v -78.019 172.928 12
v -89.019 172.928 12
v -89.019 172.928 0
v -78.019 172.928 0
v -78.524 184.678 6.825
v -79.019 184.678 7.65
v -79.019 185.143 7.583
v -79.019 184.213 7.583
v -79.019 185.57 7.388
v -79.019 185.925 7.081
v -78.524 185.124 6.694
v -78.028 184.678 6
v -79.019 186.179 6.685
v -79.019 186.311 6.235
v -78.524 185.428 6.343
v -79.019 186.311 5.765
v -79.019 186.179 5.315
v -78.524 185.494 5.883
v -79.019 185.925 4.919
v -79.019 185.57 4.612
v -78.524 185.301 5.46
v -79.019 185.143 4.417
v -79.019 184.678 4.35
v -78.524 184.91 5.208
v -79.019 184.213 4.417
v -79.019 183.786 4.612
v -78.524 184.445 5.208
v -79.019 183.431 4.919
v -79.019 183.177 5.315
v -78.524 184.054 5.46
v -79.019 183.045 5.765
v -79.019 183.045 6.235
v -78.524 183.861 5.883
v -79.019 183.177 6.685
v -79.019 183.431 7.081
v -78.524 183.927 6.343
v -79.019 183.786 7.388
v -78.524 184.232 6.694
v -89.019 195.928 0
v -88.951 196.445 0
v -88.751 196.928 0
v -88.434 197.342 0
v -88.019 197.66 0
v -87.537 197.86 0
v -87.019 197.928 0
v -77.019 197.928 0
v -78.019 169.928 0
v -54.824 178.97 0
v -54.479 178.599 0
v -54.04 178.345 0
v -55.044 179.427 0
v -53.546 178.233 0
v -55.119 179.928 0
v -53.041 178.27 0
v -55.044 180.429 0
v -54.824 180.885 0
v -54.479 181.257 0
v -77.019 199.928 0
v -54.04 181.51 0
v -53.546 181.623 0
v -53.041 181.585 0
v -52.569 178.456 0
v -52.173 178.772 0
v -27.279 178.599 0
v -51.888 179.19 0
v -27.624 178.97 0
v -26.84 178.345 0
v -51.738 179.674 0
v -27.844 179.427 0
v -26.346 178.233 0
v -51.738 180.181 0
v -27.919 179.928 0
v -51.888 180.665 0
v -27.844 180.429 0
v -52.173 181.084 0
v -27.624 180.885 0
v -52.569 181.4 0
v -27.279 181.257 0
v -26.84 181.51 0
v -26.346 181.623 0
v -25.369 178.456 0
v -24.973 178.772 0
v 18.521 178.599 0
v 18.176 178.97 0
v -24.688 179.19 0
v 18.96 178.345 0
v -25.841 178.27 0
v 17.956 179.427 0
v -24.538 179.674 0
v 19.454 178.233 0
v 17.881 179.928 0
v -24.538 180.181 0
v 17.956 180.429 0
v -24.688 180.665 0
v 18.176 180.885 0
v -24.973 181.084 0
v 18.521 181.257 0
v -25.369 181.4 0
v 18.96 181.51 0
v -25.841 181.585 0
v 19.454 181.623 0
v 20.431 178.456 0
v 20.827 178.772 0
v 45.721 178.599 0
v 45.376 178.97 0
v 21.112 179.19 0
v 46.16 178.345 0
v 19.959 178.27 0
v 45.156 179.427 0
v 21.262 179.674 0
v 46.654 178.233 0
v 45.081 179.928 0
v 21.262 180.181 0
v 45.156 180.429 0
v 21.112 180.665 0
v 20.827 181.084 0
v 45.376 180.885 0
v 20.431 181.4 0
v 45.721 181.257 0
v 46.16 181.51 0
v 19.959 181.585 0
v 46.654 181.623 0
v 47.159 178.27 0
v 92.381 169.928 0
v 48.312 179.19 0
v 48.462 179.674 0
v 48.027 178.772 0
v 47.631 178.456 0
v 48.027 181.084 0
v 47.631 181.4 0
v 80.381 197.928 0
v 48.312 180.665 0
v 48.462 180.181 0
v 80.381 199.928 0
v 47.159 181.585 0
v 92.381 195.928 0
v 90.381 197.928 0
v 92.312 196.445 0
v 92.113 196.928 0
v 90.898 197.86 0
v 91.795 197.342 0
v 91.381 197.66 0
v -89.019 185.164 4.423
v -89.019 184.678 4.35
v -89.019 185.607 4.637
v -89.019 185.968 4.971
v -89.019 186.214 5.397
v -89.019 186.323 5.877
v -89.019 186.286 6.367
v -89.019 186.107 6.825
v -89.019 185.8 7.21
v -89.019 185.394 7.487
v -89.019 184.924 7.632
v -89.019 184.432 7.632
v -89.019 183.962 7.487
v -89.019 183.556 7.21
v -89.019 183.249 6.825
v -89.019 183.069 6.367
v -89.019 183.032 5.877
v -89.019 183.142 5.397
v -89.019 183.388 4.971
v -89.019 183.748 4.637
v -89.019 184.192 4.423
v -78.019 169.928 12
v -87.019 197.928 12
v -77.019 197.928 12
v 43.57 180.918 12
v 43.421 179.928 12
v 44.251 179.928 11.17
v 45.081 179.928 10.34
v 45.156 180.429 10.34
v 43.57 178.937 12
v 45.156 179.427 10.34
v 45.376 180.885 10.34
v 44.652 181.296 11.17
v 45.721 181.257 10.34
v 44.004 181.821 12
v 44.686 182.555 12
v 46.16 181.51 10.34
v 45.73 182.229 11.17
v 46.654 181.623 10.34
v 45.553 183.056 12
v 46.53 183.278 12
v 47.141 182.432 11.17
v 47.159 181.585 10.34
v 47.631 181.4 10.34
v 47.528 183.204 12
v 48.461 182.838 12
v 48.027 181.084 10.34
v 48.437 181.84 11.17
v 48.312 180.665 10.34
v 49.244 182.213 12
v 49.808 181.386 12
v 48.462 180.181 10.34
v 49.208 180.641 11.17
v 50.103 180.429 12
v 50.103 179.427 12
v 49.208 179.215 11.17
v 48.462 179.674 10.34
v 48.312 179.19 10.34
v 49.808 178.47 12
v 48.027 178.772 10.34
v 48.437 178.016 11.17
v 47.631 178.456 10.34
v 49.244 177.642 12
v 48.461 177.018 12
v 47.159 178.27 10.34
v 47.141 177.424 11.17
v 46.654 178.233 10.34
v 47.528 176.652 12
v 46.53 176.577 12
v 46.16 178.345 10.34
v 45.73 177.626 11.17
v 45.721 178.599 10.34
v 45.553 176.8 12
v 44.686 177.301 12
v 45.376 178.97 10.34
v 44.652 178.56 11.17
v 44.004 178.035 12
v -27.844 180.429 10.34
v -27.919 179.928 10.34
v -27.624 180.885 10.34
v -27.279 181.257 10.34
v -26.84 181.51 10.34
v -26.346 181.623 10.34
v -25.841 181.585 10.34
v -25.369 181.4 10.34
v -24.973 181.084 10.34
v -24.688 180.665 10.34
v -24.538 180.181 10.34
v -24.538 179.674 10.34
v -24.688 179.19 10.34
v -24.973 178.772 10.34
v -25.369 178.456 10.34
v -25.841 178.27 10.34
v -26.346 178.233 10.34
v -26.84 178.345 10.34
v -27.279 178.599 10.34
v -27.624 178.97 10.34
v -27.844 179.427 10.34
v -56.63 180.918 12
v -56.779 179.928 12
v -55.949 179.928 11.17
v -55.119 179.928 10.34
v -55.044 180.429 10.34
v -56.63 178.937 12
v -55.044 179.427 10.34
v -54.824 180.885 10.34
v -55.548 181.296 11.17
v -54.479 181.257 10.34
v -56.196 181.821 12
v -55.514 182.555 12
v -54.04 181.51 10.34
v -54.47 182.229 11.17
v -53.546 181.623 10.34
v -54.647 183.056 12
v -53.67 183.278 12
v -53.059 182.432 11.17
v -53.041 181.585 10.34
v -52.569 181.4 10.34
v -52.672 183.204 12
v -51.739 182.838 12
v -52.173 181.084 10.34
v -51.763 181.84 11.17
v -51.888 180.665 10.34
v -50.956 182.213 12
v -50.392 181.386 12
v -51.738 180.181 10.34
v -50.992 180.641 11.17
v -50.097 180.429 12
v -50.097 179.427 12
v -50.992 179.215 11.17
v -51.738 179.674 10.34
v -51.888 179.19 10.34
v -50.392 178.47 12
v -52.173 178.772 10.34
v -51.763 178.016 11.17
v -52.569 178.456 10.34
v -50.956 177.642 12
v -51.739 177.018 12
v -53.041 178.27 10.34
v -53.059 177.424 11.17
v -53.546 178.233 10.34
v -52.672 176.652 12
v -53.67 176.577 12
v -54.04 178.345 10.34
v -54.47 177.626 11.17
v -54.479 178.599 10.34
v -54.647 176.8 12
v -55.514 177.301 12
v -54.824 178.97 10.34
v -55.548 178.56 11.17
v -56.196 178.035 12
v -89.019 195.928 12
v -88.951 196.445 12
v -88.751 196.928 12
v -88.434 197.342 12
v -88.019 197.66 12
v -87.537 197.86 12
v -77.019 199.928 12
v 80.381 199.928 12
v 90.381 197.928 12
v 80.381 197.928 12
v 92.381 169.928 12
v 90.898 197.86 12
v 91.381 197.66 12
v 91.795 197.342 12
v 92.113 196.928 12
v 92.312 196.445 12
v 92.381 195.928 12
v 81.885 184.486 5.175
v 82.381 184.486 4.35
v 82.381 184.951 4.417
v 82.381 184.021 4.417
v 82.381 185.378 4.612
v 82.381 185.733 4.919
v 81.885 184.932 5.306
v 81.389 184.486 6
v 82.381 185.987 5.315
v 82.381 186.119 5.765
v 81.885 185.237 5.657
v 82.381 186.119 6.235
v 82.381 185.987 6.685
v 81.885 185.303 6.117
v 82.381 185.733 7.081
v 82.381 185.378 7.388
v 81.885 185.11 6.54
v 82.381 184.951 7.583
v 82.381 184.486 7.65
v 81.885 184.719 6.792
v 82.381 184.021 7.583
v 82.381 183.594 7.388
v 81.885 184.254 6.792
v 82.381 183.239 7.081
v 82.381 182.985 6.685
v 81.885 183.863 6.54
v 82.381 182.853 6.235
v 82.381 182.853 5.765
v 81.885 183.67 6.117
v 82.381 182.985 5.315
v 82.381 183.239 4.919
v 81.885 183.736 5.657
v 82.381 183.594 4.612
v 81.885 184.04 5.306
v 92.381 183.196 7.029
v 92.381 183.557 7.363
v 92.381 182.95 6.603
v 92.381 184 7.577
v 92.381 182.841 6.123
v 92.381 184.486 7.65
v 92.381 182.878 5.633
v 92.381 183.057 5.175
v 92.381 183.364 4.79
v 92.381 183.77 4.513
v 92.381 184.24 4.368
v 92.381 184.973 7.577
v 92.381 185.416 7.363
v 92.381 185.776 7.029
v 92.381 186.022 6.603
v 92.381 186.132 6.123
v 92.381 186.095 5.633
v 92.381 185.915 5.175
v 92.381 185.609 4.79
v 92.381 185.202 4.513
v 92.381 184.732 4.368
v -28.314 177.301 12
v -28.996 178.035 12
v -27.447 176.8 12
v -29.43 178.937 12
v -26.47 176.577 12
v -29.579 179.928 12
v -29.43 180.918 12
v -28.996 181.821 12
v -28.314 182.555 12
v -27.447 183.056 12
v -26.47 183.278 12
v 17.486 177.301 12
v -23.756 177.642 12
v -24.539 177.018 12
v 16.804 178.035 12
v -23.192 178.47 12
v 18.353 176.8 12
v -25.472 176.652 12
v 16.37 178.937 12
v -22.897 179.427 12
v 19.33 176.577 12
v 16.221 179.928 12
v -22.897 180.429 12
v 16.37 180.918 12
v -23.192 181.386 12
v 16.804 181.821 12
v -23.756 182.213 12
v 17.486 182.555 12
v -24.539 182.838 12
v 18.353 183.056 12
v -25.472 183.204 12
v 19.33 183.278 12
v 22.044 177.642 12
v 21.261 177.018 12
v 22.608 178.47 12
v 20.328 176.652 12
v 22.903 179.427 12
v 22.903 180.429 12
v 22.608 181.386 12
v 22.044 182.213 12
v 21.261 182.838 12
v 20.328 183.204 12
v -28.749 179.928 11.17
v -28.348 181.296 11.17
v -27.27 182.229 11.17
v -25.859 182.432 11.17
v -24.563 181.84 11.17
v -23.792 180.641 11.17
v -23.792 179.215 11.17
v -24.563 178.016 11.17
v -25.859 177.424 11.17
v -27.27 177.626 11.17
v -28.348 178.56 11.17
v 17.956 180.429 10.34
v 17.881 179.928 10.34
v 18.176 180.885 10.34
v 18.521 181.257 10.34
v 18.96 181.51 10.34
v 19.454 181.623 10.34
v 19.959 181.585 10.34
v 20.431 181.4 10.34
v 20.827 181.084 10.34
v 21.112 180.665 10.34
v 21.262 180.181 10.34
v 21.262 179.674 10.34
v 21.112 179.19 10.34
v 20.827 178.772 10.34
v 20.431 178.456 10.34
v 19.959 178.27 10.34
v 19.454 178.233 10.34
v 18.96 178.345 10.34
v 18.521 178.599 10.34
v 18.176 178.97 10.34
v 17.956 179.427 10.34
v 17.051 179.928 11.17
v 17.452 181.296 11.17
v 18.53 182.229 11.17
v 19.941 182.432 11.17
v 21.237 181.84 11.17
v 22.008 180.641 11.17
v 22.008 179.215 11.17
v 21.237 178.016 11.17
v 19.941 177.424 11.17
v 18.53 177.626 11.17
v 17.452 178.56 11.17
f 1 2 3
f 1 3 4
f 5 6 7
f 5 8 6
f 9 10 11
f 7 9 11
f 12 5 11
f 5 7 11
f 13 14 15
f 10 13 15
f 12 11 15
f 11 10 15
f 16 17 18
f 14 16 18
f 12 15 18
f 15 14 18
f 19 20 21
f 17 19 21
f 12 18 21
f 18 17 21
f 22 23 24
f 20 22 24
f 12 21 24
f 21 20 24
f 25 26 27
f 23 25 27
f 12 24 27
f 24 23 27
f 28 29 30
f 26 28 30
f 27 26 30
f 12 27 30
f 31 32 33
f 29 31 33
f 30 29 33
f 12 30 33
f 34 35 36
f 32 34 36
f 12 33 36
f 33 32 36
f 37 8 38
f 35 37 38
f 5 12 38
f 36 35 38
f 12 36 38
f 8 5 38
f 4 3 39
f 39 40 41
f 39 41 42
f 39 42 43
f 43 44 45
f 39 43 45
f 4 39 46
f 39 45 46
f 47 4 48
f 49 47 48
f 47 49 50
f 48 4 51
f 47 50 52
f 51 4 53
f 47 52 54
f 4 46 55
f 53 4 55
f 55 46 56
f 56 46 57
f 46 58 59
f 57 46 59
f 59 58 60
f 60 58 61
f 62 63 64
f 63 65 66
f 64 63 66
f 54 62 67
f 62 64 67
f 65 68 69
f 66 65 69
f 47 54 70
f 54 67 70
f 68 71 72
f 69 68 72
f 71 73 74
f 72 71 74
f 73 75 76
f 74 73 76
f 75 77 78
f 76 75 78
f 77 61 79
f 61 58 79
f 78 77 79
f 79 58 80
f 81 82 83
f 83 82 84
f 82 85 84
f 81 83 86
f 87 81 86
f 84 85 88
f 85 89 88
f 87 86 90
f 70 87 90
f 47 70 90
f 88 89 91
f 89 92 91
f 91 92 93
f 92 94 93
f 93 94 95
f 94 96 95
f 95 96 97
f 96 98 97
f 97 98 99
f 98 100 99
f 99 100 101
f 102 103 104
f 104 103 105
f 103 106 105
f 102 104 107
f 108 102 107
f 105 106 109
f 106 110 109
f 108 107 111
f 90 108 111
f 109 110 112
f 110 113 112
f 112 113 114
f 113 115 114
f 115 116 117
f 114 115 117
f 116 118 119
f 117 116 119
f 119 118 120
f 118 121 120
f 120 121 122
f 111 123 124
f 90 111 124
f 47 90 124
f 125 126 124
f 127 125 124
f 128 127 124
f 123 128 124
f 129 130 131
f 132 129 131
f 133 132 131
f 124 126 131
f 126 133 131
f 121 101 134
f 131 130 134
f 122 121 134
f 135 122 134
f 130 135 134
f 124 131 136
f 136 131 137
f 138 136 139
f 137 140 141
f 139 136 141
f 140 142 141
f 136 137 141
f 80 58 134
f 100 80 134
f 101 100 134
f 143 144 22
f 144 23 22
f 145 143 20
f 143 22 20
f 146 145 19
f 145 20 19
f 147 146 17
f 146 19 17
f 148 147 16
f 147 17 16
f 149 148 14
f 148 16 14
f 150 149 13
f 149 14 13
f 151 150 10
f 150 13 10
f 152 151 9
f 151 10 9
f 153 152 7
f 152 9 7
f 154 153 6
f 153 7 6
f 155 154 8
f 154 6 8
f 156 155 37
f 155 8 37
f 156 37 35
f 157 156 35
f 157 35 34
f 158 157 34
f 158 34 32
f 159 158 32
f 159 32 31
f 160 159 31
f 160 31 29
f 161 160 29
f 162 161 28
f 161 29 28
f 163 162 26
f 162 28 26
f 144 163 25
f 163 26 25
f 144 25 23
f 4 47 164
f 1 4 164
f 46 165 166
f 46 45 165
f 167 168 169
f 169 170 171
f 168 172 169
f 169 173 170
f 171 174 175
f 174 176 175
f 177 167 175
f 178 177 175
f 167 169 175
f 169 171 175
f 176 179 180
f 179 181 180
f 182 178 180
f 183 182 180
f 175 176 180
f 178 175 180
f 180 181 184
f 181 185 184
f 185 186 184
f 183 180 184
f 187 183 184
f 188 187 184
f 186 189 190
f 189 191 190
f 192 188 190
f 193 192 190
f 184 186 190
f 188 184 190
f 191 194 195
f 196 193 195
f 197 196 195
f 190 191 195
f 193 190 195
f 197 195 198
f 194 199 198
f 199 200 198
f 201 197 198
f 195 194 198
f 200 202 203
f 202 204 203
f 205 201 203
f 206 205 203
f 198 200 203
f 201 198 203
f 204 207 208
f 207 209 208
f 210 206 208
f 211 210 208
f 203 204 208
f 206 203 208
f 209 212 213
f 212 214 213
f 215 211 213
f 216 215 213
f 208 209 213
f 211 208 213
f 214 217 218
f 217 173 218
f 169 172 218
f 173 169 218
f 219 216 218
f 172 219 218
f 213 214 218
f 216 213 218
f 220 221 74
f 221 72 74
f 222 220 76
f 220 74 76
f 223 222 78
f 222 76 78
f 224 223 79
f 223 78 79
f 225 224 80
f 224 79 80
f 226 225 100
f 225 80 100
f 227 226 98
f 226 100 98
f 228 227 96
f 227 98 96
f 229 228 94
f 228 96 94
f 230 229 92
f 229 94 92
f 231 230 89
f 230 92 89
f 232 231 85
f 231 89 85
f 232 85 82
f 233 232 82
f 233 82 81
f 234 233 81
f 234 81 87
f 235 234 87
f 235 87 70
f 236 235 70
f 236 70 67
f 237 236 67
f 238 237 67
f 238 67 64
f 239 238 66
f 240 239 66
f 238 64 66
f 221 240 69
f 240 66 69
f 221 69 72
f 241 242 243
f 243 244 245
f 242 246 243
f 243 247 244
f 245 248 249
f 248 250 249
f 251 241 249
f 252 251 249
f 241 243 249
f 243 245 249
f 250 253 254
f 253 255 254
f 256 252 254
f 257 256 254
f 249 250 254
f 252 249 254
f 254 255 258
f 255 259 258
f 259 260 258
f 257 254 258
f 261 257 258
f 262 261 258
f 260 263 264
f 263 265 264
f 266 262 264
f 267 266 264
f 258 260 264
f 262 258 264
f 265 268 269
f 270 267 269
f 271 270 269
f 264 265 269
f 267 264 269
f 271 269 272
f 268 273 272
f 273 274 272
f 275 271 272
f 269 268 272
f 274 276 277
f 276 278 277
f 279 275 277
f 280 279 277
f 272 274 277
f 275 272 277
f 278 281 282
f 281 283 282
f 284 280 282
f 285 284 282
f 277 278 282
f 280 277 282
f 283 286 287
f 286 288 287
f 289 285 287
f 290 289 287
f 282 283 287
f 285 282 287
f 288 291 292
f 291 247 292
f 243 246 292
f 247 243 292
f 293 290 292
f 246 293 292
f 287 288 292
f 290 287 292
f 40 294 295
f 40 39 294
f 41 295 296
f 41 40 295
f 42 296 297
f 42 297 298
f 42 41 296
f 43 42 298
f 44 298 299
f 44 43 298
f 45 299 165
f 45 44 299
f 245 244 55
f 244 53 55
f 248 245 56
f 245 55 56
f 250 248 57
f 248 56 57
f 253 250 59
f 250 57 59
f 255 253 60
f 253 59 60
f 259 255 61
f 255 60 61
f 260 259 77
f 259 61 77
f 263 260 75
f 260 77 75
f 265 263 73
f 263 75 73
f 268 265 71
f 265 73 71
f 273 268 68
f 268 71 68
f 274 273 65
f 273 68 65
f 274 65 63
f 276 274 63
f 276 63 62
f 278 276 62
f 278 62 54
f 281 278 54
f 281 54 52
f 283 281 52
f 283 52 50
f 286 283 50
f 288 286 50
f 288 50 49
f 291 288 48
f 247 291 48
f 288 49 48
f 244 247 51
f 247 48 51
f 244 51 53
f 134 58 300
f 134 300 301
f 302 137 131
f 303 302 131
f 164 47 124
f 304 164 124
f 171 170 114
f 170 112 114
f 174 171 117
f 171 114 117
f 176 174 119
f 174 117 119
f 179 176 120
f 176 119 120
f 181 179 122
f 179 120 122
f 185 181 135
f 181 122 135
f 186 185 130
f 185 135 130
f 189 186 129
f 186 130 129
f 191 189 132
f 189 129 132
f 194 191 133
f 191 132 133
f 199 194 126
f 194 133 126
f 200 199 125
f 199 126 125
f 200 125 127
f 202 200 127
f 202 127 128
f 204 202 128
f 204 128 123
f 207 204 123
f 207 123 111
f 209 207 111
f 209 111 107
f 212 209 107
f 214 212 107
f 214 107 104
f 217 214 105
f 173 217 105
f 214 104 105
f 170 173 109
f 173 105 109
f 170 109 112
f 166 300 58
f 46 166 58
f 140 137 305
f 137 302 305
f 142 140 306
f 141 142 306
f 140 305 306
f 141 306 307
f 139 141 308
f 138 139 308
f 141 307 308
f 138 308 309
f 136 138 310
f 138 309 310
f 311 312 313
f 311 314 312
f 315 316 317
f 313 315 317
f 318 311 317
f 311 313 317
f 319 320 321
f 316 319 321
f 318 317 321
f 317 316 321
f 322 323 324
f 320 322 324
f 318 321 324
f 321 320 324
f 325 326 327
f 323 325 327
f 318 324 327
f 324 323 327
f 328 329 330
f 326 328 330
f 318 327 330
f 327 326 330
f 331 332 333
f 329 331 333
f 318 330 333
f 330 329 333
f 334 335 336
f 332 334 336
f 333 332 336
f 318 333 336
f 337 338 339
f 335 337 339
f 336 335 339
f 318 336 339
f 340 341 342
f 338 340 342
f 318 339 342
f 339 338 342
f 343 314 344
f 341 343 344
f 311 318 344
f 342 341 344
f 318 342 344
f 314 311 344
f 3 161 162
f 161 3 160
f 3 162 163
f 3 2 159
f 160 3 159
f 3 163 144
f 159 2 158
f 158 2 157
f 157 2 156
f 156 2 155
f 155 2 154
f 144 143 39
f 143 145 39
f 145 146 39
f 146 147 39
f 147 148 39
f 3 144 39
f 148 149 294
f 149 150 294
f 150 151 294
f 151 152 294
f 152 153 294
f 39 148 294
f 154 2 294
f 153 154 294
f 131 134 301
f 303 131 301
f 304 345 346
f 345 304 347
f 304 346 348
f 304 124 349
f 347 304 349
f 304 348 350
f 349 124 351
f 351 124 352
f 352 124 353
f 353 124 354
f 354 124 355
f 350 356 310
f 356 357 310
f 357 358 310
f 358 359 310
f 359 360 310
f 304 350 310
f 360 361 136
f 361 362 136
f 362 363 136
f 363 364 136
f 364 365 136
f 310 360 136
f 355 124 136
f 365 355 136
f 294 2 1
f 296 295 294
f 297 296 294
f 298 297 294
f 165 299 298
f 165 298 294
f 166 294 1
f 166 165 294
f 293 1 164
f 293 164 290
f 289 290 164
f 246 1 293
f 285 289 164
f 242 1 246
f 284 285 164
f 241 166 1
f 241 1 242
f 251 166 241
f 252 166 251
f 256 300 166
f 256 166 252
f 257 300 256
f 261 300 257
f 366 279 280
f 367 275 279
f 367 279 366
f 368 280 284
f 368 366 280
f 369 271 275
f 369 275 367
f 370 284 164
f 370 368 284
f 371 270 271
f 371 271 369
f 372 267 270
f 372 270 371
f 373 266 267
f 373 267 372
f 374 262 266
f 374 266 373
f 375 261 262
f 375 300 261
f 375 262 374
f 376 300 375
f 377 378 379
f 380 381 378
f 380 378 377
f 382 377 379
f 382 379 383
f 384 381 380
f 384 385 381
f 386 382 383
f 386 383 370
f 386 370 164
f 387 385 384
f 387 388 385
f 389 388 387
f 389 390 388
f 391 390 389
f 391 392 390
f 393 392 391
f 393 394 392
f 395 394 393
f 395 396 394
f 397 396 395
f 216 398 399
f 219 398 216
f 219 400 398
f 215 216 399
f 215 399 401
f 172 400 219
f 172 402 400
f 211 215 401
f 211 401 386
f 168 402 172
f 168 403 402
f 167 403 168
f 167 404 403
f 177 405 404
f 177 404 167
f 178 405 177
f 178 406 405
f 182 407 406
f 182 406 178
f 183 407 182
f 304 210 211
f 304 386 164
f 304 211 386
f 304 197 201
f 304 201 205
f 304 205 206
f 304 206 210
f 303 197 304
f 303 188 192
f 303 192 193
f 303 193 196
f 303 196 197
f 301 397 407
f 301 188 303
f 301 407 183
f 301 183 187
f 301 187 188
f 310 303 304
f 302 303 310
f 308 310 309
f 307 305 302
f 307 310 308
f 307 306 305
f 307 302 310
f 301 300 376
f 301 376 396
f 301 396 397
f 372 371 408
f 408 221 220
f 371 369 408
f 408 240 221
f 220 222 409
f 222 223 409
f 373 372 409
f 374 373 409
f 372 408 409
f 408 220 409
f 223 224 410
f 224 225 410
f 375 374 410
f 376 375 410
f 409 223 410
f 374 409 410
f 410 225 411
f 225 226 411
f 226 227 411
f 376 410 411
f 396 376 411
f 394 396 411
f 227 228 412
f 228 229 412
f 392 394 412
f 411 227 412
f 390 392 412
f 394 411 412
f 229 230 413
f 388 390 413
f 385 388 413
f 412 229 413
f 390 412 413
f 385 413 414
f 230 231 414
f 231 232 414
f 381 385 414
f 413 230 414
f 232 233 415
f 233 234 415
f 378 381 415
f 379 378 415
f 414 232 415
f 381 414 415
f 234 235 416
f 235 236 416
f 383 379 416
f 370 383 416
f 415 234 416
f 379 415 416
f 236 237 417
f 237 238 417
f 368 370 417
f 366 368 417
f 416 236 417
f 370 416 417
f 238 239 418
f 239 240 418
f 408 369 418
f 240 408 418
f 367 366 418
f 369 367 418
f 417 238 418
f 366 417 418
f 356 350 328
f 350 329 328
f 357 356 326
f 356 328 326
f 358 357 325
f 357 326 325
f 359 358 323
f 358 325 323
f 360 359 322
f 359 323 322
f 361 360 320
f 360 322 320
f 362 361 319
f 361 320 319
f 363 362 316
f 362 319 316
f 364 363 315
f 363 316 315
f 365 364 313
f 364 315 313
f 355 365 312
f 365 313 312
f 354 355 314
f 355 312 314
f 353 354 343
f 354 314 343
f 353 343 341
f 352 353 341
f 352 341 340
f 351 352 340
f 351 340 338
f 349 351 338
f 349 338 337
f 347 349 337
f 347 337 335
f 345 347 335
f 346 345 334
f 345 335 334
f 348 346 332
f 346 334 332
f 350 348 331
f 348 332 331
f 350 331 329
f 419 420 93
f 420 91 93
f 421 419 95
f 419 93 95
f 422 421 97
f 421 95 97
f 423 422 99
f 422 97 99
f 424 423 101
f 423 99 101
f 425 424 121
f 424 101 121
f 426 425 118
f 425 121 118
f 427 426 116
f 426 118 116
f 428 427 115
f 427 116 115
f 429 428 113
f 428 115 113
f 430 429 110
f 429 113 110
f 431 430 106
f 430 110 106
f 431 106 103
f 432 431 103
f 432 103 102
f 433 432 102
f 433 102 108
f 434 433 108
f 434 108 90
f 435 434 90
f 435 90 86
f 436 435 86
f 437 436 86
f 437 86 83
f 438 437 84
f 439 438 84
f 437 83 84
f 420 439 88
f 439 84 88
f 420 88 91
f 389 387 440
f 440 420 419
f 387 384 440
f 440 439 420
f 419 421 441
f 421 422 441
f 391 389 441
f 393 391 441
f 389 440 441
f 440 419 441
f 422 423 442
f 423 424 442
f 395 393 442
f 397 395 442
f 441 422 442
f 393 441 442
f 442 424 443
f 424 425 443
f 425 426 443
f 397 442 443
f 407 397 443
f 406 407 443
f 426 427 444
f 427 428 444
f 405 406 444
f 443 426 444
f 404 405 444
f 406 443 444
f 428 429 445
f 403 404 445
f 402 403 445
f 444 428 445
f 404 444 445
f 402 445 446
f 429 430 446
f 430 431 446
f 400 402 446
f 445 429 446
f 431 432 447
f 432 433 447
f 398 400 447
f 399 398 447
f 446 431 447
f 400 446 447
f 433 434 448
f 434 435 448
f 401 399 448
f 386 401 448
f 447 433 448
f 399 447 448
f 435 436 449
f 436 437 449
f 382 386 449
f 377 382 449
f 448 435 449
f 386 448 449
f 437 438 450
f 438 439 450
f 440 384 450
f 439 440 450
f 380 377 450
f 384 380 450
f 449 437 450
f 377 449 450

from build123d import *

# Parameters (mm, degrees)
ESBO_O1_W                                      = 119
ESBO_O1_H                                      = 30
RESSALTO_EXTRUS_O1_DEPTH                       = 12
ESCAREADO_PARA_SFHCS_M31_D                     = 3.4
ESCAREADO_PARA_SFHCS_M31_CSINK_D               = 6.72
ESCAREADO_PARA_SFHCS_M31_CSINK_ANGLE           = 90
ESBO_O8_W                                      = 26.2
ESBO_O8_H                                      = 30
RESSALTO_EXTRUS_O2_DEPTH                       = 12
ESBO_O9_W                                      = 36.2
ESBO_O9_H                                      = 30
RESSALTO_EXTRUS_O3_DEPTH                       = 12
ESBO_O10_W                                     = 12
ESBO_O10_H                                     = 12
CORTE_EXTRUS_O1_DEPTH                          = 2
FILETE1_R                                      = 2
ESBO_O12_W                                     = 11
ESBO_O12_H                                     = 12
CORTE_EXTRUS_O2_DEPTH                          = 3
BROCA_DE_ROSQUEAR_PARA_TARRAXA_DE_M4X0_7_D     = 3.3
BROCA_DE_ROSQUEAR_PARA_TARRAXA_DE_M4X0_7_DEPTH = 10
BROCA_DE_ROSQUEAR_PARA_TARRAXA_DE_M4X0_7_TIP   = 0.991420021
ESBO_O15_W                                     = 12
ESBO_O15_H                                     = 12
CORTE_EXTRUS_O3_DEPTH                          = 2
FILETE2_R                                      = 2
BROCA_DE_ROSQUEAR_PARA_TARRAXA_DE_M4_2_D       = 3.3
BROCA_DE_ROSQUEAR_PARA_TARRAXA_DE_M4_2_DEPTH   = 10
BROCA_DE_ROSQUEAR_PARA_TARRAXA_DE_M4_2_TIP     = 0.991420021


with BuildPart() as part:
    # Esboço1 → Ressalto-extrusão1 (new body)
    with BuildSketch(Plane.XY):
        with Locations((-3.319388577, 184.927849727)):
            Rectangle(ESBO_O1_W, ESBO_O1_H)
    extrude(amount=RESSALTO_EXTRUS_O1_DEPTH)

    # Escareado para SFHCS M31 (through all)
    with Locations(Plane.XY.offset(12)):
        with Locations((46.780611423, 179.927849727), (-53.419388577, 179.927849727), (-26.219388577, 179.927849727), (19.580611423, 179.927849727)):
            CounterSinkHole(ESCAREADO_PARA_SFHCS_M31_D / 2, ESCAREADO_PARA_SFHCS_M31_CSINK_D / 2, counter_sink_angle=ESCAREADO_PARA_SFHCS_M31_CSINK_ANGLE)

    # Esboço8 → Ressalto-extrusão2 (add)
    with BuildSketch(Plane.XY.offset(12)):
        with Locations((-75.919388577, 184.927849727)):
            Rectangle(ESBO_O8_W, ESBO_O8_H)
    extrude(amount=-RESSALTO_EXTRUS_O2_DEPTH)

    # Esboço9 → Ressalto-extrusão3 (add)
    with BuildSketch(Plane.XY):
        with Locations((74.280611423, 184.927849727)):
            Rectangle(ESBO_O9_W, ESBO_O9_H)
    extrude(amount=RESSALTO_EXTRUS_O3_DEPTH)

    # Esboço10 → Corte-extrusão1 (cut)
    with BuildSketch(Plane(origin=(0, 199.927849727, 0), x_dir=(1, 0, 0), z_dir=(0, 1, 0))):
        with Locations((-83.019388577, -6)):
            Rectangle(ESBO_O10_W, ESBO_O10_H)
    extrude(amount=-CORTE_EXTRUS_O1_DEPTH, mode=Mode.SUBTRACT)

    # Filete1
    filete1_edges = [part.edges().sort_by_distance(p)[0] for p in [
        (-89.019388577, 197.927849727, 6),
    ]]
    fillet(filete1_edges, radius=FILETE1_R)

    # Esboço12 → Corte-extrusão2 (cut)
    with BuildSketch(Plane.XZ.offset(-169.927849727)):
        with Locations((-83.519388577, 6)):
            Rectangle(ESBO_O12_W, ESBO_O12_H)
    extrude(amount=-CORTE_EXTRUS_O2_DEPTH, mode=Mode.SUBTRACT)

    # Broca de rosquear para tarraxa de M4x0.7
    with Locations(Plane.ZY.offset(89.019388577)):
        with Locations((6, 184.677849727)):
            Hole(BROCA_DE_ROSQUEAR_PARA_TARRAXA_DE_M4X0_7_D / 2, depth=BROCA_DE_ROSQUEAR_PARA_TARRAXA_DE_M4X0_7_DEPTH)
            with Locations((0, 0, -(BROCA_DE_ROSQUEAR_PARA_TARRAXA_DE_M4X0_7_DEPTH + BROCA_DE_ROSQUEAR_PARA_TARRAXA_DE_M4X0_7_TIP / 2))):  # 118° drill point
                Cone(0, BROCA_DE_ROSQUEAR_PARA_TARRAXA_DE_M4X0_7_D / 2, BROCA_DE_ROSQUEAR_PARA_TARRAXA_DE_M4X0_7_TIP, mode=Mode.SUBTRACT)

    # Esboço15 → Corte-extrusão3 (cut)
    with BuildSketch(Plane(origin=(0, 199.927849727, 0), x_dir=(-1, 0, 0), z_dir=(0, 1, 0))):
        with Locations((-86.380611423, 6)):
            Rectangle(ESBO_O15_W, ESBO_O15_H)
    extrude(amount=-CORTE_EXTRUS_O3_DEPTH, mode=Mode.SUBTRACT)

    # Filete2
    filete2_edges = [part.edges().sort_by_distance(p)[0] for p in [
        (92.380611423, 197.927849727, 6),
    ]]
    fillet(filete2_edges, radius=FILETE2_R)

    # Broca de rosquear para tarraxa de M4 2
    with Locations(Plane(origin=(92.380611423, 0, 0), x_dir=(0, 0, -1), z_dir=(1, 0, 0))):
        with Locations((-6, 184.4862903)):
            Hole(BROCA_DE_ROSQUEAR_PARA_TARRAXA_DE_M4_2_D / 2, depth=BROCA_DE_ROSQUEAR_PARA_TARRAXA_DE_M4_2_DEPTH)
            with Locations((0, 0, -(BROCA_DE_ROSQUEAR_PARA_TARRAXA_DE_M4_2_DEPTH + BROCA_DE_ROSQUEAR_PARA_TARRAXA_DE_M4_2_TIP / 2))):  # 118° drill point
                Cone(0, BROCA_DE_ROSQUEAR_PARA_TARRAXA_DE_M4_2_D / 2, BROCA_DE_ROSQUEAR_PARA_TARRAXA_DE_M4_2_TIP, mode=Mode.SUBTRACT)


solid = part.part
